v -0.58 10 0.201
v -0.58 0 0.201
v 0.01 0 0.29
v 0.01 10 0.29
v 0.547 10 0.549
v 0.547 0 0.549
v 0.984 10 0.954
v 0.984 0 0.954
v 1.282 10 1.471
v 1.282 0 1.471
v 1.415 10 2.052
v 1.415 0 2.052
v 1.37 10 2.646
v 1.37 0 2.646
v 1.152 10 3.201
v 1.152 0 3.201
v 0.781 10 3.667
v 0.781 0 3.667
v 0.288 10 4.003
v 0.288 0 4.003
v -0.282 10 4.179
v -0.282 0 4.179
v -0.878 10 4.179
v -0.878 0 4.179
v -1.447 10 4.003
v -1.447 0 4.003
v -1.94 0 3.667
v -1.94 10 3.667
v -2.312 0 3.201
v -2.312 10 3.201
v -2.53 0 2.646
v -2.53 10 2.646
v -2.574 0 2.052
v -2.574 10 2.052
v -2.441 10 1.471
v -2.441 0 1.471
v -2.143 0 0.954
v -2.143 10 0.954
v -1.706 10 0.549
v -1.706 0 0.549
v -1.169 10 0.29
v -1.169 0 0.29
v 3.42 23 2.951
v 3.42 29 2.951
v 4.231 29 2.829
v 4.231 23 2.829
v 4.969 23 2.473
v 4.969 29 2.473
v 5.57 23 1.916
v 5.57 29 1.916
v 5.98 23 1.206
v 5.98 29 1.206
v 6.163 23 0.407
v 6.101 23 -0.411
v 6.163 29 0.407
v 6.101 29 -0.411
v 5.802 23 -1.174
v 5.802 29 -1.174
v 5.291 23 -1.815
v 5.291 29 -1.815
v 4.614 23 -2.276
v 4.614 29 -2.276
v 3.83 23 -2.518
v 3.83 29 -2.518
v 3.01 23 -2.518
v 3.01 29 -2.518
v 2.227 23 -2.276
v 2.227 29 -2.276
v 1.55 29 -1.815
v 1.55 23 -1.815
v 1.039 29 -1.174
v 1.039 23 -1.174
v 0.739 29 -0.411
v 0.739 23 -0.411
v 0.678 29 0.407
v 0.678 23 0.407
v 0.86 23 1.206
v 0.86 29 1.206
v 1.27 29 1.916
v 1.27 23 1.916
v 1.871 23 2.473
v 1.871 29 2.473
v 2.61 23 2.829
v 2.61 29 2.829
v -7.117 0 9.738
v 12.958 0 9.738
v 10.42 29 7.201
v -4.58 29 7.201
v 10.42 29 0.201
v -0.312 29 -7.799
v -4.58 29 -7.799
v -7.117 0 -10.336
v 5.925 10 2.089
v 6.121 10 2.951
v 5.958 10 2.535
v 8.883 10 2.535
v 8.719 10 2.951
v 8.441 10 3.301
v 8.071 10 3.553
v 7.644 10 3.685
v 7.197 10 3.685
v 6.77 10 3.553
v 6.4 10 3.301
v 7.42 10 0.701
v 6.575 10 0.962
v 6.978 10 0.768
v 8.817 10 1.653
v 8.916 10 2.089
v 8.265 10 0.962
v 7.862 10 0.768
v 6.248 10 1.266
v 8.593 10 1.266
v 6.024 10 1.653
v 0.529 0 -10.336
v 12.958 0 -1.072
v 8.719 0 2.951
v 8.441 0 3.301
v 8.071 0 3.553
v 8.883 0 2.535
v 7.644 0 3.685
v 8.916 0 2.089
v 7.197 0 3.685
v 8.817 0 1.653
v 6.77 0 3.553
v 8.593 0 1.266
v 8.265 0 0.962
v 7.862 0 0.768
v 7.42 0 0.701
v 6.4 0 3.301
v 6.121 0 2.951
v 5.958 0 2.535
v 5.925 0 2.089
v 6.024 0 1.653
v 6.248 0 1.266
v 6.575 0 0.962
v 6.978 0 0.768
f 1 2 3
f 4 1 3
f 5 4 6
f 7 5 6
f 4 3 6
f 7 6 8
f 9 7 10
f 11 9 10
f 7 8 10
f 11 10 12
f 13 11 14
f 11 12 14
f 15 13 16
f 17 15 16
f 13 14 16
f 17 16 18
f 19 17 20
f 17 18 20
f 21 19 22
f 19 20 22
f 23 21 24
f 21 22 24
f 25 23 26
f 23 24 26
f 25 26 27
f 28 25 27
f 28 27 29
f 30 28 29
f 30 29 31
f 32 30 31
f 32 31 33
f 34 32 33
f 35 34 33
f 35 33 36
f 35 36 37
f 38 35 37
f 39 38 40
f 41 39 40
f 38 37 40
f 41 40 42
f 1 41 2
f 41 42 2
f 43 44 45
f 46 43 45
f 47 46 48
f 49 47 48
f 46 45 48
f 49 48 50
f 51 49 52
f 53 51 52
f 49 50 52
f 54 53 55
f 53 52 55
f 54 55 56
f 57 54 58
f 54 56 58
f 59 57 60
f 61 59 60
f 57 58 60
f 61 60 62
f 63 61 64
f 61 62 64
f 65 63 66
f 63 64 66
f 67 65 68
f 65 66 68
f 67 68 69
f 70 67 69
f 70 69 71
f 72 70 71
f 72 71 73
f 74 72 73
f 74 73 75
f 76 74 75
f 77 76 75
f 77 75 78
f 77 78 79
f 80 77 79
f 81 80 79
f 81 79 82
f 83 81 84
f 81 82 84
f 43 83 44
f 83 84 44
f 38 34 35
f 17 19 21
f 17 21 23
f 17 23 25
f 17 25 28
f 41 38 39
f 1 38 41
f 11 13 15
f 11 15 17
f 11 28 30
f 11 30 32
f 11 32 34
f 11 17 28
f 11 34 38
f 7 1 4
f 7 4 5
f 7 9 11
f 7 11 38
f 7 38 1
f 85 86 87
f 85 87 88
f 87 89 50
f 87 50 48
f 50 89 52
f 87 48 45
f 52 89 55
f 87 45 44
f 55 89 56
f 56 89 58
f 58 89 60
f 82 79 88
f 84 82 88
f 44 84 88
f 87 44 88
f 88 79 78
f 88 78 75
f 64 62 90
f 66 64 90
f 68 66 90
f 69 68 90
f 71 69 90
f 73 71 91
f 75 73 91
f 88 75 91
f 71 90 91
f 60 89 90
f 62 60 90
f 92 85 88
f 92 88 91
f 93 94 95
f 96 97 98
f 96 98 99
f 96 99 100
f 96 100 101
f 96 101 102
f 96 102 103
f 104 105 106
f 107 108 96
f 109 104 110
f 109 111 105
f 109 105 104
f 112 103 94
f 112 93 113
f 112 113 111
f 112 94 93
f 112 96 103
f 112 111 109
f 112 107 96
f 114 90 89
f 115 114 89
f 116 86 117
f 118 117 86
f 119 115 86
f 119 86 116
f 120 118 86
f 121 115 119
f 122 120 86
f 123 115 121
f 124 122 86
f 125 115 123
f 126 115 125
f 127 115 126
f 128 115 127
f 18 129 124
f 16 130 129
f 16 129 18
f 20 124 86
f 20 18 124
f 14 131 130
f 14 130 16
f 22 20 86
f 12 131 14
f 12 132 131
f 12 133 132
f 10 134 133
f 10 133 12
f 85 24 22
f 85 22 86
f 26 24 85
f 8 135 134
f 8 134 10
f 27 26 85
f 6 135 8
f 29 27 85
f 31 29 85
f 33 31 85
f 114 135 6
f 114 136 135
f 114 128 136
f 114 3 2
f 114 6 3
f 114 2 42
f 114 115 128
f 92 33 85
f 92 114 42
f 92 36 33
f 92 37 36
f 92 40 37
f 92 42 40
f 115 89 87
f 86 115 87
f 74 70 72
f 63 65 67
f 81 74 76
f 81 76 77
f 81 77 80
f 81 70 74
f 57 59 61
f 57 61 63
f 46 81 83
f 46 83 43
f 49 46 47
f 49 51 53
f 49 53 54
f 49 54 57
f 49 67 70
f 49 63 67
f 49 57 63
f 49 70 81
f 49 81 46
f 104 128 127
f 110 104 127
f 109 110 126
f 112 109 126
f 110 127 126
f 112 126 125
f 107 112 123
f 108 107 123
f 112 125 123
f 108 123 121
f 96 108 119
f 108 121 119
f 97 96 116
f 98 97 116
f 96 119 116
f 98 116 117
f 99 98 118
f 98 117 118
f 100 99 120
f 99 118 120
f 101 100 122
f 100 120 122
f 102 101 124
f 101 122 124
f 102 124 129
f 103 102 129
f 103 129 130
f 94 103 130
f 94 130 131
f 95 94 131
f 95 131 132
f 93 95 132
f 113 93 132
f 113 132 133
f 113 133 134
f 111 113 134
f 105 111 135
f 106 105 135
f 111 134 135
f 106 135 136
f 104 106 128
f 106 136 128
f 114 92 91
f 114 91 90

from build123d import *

# Parameters (mm, degrees)
BOSS_EXTRUDE1_DEPTH = 29
SKETCH2_R           = 2
SKETCH2_R_2         = 1.5
CUT_EXTRUDE1_DEPTH  = 10
SKETCH3_R           = 2.75
CUT_EXTRUDE2_DEPTH  = 6
DRAFT1_ANGLE        = 5


with BuildPart() as part:
    # Sketch1 → Boss-Extrude1 (new body)
    with BuildSketch(Plane(origin=(0, 0, 0), x_dir=(1, 0, 0), z_dir=(0, 1, 0))):
        Polygon((10.420353982, -7.201327434), (-4.579646018, -7.201327434), (-4.579646018, 7.798672566), (-0.312469404, 7.798672566), (10.420353982, -0.201327434), align=None)
    extrude(amount=BOSS_EXTRUDE1_DEPTH)

    # Sketch2 → Cut-Extrude1 (cut)
    with BuildSketch(Plane.XZ):
        with Locations(Location((-0.579646018, 2.201327434, 0), (0, 0, 270))):
            Circle(SKETCH2_R)
        with Locations(Location((7.420353982, 2.201327434, 0), (0, 0, 270))):
            Circle(SKETCH2_R_2)
    extrude(amount=-CUT_EXTRUDE1_DEPTH, mode=Mode.SUBTRACT)

    # Sketch3 → Cut-Extrude2 (cut)
    with BuildSketch(Plane(origin=(0, 29, 0), x_dir=(1, 0, 0), z_dir=(0, 1, 0))):
        with Locations(Location((3.420353982, -0.201327434, 0), (0, 0, 270))):
            Circle(SKETCH3_R)
    extrude(amount=-CUT_EXTRUDE2_DEPTH, mode=Mode.SUBTRACT)

    # Draft1
    draft1_faces = [part.faces().sort_by_distance(p)[0] for p in [
        (5.053942289, 14.5, -3.798672566),
        (-2.446057711, 14.5, -7.798672566),
        (-4.579646018, 14.5, -0.298672566),
        (10.420353982, 14.5, 3.701327434),
        (2.920353982, 14.5, 7.201327434),
    ]]
    draft(draft1_faces, Plane.ZX.offset(29), DRAFT1_ANGLE)


solid = part.part
